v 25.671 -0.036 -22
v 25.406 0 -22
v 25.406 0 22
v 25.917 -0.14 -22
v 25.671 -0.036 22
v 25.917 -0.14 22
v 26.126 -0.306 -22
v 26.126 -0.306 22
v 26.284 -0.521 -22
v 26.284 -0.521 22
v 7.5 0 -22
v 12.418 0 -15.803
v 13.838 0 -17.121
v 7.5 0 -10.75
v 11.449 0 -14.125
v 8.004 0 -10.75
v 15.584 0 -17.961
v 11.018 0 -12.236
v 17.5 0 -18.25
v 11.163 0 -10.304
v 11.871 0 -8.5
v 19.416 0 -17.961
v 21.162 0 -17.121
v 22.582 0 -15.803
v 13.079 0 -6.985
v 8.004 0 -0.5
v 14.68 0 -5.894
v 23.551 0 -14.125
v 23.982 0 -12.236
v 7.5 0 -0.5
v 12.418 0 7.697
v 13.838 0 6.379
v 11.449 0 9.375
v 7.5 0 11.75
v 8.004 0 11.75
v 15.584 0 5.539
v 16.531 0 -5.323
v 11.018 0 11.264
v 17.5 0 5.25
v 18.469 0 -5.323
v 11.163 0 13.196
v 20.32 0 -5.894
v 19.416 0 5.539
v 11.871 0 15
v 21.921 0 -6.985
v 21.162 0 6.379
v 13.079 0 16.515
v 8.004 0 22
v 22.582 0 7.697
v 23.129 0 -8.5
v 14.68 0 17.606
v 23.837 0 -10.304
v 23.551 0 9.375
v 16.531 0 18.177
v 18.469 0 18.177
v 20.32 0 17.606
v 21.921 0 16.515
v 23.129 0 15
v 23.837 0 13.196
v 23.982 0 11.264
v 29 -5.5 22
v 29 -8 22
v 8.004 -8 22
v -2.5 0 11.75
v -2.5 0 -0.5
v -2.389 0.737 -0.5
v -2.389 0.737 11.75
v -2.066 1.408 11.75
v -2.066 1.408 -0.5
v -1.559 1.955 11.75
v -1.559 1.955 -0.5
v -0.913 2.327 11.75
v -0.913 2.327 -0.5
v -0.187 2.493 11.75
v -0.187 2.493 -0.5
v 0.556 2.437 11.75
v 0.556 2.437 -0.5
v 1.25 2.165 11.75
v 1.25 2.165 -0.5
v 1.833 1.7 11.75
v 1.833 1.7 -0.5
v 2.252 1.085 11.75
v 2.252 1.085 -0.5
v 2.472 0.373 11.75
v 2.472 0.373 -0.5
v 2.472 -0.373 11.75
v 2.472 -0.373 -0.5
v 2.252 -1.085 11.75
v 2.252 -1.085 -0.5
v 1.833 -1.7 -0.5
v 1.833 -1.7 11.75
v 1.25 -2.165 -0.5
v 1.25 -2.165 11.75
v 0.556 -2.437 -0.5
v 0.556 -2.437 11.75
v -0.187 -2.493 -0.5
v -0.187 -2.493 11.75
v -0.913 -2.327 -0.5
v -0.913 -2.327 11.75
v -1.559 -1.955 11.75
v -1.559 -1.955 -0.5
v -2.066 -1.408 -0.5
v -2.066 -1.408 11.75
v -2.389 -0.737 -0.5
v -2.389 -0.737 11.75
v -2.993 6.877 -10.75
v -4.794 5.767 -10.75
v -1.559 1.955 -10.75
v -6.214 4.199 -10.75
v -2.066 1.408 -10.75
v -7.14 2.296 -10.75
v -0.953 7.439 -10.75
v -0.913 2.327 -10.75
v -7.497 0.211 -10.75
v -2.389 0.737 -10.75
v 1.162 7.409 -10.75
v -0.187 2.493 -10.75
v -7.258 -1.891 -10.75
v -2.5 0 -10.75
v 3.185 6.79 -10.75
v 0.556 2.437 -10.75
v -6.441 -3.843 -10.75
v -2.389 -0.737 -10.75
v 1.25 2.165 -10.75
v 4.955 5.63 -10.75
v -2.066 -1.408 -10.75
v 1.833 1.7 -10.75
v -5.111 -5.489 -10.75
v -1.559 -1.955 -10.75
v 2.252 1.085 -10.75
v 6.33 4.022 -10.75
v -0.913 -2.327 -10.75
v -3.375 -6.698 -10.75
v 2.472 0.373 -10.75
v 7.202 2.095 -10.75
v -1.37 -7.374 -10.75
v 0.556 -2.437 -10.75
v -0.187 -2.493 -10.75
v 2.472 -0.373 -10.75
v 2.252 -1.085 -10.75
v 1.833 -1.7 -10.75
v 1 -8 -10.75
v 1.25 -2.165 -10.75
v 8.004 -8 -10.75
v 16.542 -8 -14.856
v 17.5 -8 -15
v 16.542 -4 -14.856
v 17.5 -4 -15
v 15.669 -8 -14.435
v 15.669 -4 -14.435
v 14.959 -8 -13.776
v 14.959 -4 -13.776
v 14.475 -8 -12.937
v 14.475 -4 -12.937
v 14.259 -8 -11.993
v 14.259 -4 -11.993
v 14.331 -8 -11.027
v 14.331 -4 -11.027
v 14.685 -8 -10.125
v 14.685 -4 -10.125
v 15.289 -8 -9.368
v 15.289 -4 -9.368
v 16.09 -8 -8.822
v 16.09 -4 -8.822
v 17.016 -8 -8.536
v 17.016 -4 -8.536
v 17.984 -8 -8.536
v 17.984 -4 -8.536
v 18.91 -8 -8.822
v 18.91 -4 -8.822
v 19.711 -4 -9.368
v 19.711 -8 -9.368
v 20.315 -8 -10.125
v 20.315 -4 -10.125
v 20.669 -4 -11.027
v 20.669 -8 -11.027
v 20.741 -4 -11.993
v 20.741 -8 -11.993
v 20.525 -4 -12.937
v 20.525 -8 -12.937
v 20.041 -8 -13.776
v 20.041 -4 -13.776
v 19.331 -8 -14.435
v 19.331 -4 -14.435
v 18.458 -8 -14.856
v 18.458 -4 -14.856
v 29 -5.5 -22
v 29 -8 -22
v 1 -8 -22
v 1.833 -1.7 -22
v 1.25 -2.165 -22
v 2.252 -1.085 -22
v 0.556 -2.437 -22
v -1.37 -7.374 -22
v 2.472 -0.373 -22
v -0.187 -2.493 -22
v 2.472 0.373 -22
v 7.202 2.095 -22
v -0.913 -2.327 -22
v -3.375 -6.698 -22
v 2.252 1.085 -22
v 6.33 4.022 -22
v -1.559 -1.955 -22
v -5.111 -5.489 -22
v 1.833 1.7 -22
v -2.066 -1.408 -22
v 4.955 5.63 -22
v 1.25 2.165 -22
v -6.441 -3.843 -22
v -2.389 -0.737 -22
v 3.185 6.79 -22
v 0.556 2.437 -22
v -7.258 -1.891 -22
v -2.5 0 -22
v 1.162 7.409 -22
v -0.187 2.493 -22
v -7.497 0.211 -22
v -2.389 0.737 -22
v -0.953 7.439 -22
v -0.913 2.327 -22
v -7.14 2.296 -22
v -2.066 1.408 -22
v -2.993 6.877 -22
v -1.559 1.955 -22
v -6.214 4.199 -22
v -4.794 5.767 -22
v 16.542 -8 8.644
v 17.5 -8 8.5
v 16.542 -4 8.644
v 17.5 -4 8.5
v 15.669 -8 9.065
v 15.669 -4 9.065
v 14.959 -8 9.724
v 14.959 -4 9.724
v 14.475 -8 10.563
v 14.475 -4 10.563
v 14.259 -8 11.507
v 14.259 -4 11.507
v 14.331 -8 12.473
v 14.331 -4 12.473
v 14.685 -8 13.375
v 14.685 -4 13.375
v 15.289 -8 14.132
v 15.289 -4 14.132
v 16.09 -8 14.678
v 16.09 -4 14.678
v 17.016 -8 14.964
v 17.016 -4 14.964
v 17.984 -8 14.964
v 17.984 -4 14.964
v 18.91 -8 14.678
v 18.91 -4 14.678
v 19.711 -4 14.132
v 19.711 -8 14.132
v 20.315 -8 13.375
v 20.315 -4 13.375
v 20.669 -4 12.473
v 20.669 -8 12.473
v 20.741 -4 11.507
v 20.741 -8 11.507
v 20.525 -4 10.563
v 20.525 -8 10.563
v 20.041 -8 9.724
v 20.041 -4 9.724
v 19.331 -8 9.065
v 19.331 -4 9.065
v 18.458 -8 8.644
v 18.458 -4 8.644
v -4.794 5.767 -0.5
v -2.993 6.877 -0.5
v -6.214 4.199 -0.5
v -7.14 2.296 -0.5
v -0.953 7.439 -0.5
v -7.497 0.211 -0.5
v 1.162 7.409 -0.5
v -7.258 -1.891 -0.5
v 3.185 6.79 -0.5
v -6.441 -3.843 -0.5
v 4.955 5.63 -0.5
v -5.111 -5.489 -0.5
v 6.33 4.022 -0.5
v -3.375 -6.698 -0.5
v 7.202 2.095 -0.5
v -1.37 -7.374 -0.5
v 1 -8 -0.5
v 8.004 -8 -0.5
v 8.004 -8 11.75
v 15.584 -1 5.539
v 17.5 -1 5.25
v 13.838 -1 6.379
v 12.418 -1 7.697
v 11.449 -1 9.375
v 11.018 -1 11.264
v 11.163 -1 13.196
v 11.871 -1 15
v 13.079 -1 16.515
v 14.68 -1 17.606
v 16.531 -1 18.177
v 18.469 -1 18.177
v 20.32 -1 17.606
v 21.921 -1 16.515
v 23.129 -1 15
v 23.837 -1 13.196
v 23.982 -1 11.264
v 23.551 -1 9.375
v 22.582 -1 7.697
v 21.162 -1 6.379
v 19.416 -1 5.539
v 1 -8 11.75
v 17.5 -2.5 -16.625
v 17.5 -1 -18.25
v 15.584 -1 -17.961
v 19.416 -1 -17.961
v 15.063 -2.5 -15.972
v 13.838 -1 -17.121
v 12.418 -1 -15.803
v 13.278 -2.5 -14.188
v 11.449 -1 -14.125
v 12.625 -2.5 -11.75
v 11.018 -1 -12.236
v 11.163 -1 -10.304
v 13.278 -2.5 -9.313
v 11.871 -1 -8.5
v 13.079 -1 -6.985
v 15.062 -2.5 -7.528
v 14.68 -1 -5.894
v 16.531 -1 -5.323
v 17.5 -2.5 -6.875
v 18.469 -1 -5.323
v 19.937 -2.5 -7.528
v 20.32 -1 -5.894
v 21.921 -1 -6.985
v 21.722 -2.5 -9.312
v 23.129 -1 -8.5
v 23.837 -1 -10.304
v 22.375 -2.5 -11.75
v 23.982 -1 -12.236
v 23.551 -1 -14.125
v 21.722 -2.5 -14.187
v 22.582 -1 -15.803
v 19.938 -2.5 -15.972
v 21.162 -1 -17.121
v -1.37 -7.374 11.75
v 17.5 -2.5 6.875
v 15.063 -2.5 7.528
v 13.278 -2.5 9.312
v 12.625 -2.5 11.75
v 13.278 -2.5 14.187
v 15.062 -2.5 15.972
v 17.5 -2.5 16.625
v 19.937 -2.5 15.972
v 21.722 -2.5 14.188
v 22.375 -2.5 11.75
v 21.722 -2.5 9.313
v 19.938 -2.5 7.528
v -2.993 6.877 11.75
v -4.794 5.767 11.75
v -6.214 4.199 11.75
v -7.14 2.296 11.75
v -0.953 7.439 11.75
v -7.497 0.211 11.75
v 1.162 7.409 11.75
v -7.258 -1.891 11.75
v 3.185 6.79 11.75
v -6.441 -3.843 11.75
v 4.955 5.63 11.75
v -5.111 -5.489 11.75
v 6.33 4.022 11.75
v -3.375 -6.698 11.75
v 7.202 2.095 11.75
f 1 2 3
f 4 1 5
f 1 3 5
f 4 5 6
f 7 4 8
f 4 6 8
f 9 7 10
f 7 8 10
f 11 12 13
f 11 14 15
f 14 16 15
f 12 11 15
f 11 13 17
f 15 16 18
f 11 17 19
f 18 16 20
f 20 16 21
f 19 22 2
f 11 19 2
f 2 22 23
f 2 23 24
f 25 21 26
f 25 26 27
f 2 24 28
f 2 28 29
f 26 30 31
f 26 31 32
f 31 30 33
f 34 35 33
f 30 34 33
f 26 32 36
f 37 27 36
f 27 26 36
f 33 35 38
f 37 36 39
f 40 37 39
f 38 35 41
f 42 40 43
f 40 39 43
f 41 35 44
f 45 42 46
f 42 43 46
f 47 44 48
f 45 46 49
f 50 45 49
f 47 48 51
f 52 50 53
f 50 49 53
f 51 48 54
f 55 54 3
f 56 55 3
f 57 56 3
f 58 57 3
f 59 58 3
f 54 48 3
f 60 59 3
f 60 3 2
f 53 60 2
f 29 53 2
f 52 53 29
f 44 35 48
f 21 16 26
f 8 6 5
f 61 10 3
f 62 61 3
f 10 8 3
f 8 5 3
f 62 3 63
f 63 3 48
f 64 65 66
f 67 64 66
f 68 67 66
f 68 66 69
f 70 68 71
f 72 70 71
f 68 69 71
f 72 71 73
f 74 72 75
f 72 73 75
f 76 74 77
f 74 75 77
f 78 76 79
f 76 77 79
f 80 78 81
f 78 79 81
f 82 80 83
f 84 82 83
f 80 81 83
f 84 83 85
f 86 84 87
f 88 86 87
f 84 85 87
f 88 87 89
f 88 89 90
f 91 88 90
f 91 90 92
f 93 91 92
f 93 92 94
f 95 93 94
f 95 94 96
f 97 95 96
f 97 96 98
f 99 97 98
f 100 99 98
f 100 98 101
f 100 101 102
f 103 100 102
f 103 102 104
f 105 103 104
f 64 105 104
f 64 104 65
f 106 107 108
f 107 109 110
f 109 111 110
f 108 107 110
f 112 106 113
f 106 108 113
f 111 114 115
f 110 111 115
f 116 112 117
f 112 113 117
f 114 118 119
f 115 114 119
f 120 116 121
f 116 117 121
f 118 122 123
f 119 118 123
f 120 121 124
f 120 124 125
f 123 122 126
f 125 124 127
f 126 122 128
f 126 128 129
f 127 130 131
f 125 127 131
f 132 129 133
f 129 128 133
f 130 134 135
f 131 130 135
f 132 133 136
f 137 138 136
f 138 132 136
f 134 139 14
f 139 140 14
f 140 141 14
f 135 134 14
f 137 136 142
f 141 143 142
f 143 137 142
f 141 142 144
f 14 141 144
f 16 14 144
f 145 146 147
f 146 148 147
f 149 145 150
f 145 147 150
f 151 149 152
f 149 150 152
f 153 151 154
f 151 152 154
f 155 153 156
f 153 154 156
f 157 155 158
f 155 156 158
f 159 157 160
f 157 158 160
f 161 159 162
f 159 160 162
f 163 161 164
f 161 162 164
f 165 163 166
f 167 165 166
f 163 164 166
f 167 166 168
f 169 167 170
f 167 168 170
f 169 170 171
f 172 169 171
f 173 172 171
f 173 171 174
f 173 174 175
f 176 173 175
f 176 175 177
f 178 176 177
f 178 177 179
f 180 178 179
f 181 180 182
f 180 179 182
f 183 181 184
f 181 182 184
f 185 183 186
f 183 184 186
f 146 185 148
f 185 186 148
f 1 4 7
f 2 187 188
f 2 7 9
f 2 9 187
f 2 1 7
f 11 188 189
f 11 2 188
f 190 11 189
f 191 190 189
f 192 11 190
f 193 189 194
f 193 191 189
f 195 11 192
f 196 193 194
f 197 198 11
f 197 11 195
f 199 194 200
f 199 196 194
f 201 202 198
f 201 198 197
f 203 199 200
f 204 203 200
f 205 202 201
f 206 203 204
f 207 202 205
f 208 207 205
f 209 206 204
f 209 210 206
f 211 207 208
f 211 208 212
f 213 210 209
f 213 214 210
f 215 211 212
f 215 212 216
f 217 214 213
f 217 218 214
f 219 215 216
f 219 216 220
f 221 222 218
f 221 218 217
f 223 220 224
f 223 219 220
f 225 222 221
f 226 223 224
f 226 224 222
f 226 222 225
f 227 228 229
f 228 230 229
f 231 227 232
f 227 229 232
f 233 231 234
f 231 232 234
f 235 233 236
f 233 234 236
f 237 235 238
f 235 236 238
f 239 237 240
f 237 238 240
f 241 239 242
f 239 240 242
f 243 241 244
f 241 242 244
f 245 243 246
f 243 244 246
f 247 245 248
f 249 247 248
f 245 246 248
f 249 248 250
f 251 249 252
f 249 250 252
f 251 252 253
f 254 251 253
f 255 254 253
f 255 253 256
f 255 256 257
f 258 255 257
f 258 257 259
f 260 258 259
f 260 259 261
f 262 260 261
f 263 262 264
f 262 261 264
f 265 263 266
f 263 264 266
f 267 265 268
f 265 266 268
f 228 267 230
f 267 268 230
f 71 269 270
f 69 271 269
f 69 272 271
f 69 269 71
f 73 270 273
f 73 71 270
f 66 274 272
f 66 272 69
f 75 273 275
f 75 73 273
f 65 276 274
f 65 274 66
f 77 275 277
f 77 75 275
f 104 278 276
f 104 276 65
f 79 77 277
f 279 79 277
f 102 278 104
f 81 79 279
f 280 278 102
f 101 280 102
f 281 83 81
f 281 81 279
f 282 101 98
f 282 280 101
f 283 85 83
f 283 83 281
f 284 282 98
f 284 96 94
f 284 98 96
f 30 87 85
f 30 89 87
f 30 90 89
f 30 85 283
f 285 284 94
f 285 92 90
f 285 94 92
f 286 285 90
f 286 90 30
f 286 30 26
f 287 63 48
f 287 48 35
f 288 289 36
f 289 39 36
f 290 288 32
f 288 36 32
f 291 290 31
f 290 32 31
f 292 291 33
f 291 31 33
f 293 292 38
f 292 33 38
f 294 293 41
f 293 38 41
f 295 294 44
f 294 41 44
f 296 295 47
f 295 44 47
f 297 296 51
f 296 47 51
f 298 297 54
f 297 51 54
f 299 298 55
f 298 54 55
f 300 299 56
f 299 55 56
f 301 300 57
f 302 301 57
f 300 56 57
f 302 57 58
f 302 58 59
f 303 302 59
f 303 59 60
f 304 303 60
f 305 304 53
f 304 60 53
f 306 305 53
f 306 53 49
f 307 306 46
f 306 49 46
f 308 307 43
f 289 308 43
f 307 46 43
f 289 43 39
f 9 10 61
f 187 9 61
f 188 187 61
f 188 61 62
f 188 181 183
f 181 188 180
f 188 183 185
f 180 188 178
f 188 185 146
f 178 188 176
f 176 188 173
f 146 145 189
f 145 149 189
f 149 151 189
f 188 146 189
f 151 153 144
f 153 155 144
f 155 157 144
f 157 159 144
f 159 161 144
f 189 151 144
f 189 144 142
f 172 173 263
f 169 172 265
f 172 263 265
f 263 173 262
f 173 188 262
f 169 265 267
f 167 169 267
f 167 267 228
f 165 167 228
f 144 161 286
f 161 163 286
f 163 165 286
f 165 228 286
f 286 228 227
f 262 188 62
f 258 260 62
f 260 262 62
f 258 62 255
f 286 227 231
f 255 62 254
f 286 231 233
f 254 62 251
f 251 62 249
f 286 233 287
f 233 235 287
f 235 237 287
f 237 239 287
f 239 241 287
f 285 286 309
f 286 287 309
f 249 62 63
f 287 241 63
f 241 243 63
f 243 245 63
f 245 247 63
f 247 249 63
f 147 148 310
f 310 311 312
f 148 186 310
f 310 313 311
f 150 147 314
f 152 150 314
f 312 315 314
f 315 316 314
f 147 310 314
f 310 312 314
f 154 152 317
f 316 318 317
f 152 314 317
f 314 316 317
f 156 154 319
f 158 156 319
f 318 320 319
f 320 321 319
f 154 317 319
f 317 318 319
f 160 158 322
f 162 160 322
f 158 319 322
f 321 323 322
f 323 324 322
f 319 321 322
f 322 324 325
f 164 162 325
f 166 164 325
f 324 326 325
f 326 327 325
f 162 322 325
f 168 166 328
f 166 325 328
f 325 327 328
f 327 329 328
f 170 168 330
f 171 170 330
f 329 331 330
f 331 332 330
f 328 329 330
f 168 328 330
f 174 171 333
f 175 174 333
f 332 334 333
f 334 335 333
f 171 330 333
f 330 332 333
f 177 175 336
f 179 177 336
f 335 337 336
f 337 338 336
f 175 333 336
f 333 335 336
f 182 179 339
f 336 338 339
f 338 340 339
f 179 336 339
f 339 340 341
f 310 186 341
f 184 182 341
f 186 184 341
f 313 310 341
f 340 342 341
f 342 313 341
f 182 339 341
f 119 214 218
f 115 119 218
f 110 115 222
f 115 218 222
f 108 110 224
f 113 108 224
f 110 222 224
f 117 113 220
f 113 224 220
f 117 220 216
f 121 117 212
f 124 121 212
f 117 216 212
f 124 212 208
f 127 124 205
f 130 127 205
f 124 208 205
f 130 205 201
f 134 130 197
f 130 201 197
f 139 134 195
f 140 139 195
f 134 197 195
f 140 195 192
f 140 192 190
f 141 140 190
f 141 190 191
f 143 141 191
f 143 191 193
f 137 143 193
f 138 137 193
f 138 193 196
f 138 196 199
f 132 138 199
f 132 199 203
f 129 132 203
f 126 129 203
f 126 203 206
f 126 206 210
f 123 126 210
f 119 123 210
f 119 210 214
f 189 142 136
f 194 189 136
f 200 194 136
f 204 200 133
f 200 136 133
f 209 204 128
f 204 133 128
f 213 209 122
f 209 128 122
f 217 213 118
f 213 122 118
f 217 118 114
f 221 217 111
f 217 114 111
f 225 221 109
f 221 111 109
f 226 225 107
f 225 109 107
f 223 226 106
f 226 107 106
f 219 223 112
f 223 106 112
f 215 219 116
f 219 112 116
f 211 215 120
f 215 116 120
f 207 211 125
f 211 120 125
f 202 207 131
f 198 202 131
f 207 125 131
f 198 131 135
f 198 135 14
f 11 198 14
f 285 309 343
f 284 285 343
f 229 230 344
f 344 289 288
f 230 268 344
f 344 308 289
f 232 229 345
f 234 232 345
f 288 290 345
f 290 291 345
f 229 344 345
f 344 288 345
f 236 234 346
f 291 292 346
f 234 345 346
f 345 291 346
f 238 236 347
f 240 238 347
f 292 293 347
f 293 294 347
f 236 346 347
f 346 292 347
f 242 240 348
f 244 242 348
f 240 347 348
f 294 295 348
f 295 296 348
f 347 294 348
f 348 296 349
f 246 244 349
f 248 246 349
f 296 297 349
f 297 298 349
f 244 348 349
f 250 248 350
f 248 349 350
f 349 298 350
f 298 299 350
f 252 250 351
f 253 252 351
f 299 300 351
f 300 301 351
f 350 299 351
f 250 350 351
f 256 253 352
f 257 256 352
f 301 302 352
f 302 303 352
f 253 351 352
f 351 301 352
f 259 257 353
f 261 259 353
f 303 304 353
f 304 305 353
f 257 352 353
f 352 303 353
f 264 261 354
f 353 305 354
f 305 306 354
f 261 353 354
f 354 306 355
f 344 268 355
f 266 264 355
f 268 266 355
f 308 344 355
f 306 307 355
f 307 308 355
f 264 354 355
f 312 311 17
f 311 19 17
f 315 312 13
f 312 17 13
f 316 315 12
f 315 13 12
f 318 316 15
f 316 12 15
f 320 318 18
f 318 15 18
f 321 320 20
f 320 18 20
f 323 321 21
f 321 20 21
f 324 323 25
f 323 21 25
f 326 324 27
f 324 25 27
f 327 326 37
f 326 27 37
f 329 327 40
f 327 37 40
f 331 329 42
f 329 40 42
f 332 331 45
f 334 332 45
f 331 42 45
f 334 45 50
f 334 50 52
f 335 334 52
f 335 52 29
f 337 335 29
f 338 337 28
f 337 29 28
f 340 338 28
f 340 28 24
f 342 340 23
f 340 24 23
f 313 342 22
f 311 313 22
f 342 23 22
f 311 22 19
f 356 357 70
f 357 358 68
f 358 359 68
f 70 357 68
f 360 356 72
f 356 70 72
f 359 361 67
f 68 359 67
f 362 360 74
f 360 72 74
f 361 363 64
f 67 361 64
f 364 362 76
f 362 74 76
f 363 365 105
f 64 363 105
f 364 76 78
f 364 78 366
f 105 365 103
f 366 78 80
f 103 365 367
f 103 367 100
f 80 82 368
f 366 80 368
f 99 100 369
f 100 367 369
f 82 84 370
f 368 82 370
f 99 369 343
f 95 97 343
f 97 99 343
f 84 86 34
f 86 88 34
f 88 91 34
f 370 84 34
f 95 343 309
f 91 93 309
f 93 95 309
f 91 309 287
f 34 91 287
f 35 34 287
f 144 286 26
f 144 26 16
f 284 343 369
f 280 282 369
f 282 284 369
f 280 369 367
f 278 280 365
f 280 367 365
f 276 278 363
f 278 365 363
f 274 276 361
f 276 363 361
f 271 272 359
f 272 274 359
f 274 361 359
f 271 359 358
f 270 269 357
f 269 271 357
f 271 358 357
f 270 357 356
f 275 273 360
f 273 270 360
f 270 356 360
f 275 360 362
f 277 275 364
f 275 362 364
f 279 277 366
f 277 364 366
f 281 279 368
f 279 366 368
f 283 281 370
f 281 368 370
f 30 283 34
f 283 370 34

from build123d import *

# Parameters (mm, degrees)
EXTRUDE_1_DEPTH          = 22
PATTERN_LINEAR_1_COUNT   = 2
PATTERN_LINEAR_1_PITCH   = 23.5
CUT_EXTRUDE_1_DEPTH      = 38.269290307
CUT_EXTRUDE_1_DEPTH_BACK = 38.269290307
SKETCH_4_W               = 16.100903004
SKETCH_4_H               = 10.25
SKETCH_5_R               = 2.5
CUT_EXTRUDE_2_DEPTH      = 54.301031885


with BuildPart() as part:
    # 草图1 → 凸台-拉伸1 (new, symmetric)
    with BuildSketch(Plane.XY):
        with BuildLine():
            Line((29, -5.5), (29, -8))
            Line((29, -8), (1, -8))
            Line((1, -8), (-1.370141735, -7.373785434))
            ThreePointArc((-1.370141735, -7.373785434), (-4.794472702, 5.767411162), (7.5, 0))
            Line((7.5, 0), (25.406366901, 0))
            ThreePointArc((25.406366901, 0), (25.916831332, -0.140101131), (26.284262474, -0.521147869))
            Line((26.284262474, -0.521147869), (29, -5.5))
        make_face()
    extrude(amount=EXTRUDE_1_DEPTH, both=True)

    # 草图3 → 切除-旋转1 (revolve, cut)
    with BuildSketch(Plane.XY.offset(11.75), mode=Mode.PRIVATE) as cut_revolve_1_sk:
        Polygon((24, 0), (17.5, 0), (17.5, -8), (20.75, -8), (20.75, -4), (24, -1), align=None)
    cut_revolve_1 = revolve(cut_revolve_1_sk.sketch.rotate(Axis((17.5, -8, 11.75), (0, 1, 0)), 90), axis=Axis((17.5, -8, 11.75), (0, 1, 0)), mode=Mode.SUBTRACT)

    # 阵列(线性)1: 切除-旋转1 ×2
    with Locations(*[(0, 0, -i * PATTERN_LINEAR_1_PITCH) for i in range(1, PATTERN_LINEAR_1_COUNT)]):
        add(cut_revolve_1, mode=Mode.SUBTRACT)

    # 草图4 → 切除-拉伸1 (cut, two sides: drawn at the far end of the back side and taken through both)
    with BuildSketch(Plane(origin=(0, 0, 0), x_dir=(1, 0, 0), z_dir=(0, 1, 0)).offset(-CUT_EXTRUDE_1_DEPTH_BACK)):
        with Locations((-0.04685673, -16.875)):
            Rectangle(SKETCH_4_W, SKETCH_4_H)
        with Locations((-0.04685673, 5.625)):
            Rectangle(SKETCH_4_W, SKETCH_4_H)
    extrude(amount=CUT_EXTRUDE_1_DEPTH + CUT_EXTRUDE_1_DEPTH_BACK, mode=Mode.SUBTRACT)

    # 草图5 → 切除-拉伸2 (cut, through all)
    with BuildSketch(Plane(origin=(0, 0, -22), x_dir=(-1, 0, 0), z_dir=(0, 0, -1))):
        Circle(SKETCH_5_R)
    extrude(amount=-CUT_EXTRUDE_2_DEPTH, mode=Mode.SUBTRACT)


solid = part.part
